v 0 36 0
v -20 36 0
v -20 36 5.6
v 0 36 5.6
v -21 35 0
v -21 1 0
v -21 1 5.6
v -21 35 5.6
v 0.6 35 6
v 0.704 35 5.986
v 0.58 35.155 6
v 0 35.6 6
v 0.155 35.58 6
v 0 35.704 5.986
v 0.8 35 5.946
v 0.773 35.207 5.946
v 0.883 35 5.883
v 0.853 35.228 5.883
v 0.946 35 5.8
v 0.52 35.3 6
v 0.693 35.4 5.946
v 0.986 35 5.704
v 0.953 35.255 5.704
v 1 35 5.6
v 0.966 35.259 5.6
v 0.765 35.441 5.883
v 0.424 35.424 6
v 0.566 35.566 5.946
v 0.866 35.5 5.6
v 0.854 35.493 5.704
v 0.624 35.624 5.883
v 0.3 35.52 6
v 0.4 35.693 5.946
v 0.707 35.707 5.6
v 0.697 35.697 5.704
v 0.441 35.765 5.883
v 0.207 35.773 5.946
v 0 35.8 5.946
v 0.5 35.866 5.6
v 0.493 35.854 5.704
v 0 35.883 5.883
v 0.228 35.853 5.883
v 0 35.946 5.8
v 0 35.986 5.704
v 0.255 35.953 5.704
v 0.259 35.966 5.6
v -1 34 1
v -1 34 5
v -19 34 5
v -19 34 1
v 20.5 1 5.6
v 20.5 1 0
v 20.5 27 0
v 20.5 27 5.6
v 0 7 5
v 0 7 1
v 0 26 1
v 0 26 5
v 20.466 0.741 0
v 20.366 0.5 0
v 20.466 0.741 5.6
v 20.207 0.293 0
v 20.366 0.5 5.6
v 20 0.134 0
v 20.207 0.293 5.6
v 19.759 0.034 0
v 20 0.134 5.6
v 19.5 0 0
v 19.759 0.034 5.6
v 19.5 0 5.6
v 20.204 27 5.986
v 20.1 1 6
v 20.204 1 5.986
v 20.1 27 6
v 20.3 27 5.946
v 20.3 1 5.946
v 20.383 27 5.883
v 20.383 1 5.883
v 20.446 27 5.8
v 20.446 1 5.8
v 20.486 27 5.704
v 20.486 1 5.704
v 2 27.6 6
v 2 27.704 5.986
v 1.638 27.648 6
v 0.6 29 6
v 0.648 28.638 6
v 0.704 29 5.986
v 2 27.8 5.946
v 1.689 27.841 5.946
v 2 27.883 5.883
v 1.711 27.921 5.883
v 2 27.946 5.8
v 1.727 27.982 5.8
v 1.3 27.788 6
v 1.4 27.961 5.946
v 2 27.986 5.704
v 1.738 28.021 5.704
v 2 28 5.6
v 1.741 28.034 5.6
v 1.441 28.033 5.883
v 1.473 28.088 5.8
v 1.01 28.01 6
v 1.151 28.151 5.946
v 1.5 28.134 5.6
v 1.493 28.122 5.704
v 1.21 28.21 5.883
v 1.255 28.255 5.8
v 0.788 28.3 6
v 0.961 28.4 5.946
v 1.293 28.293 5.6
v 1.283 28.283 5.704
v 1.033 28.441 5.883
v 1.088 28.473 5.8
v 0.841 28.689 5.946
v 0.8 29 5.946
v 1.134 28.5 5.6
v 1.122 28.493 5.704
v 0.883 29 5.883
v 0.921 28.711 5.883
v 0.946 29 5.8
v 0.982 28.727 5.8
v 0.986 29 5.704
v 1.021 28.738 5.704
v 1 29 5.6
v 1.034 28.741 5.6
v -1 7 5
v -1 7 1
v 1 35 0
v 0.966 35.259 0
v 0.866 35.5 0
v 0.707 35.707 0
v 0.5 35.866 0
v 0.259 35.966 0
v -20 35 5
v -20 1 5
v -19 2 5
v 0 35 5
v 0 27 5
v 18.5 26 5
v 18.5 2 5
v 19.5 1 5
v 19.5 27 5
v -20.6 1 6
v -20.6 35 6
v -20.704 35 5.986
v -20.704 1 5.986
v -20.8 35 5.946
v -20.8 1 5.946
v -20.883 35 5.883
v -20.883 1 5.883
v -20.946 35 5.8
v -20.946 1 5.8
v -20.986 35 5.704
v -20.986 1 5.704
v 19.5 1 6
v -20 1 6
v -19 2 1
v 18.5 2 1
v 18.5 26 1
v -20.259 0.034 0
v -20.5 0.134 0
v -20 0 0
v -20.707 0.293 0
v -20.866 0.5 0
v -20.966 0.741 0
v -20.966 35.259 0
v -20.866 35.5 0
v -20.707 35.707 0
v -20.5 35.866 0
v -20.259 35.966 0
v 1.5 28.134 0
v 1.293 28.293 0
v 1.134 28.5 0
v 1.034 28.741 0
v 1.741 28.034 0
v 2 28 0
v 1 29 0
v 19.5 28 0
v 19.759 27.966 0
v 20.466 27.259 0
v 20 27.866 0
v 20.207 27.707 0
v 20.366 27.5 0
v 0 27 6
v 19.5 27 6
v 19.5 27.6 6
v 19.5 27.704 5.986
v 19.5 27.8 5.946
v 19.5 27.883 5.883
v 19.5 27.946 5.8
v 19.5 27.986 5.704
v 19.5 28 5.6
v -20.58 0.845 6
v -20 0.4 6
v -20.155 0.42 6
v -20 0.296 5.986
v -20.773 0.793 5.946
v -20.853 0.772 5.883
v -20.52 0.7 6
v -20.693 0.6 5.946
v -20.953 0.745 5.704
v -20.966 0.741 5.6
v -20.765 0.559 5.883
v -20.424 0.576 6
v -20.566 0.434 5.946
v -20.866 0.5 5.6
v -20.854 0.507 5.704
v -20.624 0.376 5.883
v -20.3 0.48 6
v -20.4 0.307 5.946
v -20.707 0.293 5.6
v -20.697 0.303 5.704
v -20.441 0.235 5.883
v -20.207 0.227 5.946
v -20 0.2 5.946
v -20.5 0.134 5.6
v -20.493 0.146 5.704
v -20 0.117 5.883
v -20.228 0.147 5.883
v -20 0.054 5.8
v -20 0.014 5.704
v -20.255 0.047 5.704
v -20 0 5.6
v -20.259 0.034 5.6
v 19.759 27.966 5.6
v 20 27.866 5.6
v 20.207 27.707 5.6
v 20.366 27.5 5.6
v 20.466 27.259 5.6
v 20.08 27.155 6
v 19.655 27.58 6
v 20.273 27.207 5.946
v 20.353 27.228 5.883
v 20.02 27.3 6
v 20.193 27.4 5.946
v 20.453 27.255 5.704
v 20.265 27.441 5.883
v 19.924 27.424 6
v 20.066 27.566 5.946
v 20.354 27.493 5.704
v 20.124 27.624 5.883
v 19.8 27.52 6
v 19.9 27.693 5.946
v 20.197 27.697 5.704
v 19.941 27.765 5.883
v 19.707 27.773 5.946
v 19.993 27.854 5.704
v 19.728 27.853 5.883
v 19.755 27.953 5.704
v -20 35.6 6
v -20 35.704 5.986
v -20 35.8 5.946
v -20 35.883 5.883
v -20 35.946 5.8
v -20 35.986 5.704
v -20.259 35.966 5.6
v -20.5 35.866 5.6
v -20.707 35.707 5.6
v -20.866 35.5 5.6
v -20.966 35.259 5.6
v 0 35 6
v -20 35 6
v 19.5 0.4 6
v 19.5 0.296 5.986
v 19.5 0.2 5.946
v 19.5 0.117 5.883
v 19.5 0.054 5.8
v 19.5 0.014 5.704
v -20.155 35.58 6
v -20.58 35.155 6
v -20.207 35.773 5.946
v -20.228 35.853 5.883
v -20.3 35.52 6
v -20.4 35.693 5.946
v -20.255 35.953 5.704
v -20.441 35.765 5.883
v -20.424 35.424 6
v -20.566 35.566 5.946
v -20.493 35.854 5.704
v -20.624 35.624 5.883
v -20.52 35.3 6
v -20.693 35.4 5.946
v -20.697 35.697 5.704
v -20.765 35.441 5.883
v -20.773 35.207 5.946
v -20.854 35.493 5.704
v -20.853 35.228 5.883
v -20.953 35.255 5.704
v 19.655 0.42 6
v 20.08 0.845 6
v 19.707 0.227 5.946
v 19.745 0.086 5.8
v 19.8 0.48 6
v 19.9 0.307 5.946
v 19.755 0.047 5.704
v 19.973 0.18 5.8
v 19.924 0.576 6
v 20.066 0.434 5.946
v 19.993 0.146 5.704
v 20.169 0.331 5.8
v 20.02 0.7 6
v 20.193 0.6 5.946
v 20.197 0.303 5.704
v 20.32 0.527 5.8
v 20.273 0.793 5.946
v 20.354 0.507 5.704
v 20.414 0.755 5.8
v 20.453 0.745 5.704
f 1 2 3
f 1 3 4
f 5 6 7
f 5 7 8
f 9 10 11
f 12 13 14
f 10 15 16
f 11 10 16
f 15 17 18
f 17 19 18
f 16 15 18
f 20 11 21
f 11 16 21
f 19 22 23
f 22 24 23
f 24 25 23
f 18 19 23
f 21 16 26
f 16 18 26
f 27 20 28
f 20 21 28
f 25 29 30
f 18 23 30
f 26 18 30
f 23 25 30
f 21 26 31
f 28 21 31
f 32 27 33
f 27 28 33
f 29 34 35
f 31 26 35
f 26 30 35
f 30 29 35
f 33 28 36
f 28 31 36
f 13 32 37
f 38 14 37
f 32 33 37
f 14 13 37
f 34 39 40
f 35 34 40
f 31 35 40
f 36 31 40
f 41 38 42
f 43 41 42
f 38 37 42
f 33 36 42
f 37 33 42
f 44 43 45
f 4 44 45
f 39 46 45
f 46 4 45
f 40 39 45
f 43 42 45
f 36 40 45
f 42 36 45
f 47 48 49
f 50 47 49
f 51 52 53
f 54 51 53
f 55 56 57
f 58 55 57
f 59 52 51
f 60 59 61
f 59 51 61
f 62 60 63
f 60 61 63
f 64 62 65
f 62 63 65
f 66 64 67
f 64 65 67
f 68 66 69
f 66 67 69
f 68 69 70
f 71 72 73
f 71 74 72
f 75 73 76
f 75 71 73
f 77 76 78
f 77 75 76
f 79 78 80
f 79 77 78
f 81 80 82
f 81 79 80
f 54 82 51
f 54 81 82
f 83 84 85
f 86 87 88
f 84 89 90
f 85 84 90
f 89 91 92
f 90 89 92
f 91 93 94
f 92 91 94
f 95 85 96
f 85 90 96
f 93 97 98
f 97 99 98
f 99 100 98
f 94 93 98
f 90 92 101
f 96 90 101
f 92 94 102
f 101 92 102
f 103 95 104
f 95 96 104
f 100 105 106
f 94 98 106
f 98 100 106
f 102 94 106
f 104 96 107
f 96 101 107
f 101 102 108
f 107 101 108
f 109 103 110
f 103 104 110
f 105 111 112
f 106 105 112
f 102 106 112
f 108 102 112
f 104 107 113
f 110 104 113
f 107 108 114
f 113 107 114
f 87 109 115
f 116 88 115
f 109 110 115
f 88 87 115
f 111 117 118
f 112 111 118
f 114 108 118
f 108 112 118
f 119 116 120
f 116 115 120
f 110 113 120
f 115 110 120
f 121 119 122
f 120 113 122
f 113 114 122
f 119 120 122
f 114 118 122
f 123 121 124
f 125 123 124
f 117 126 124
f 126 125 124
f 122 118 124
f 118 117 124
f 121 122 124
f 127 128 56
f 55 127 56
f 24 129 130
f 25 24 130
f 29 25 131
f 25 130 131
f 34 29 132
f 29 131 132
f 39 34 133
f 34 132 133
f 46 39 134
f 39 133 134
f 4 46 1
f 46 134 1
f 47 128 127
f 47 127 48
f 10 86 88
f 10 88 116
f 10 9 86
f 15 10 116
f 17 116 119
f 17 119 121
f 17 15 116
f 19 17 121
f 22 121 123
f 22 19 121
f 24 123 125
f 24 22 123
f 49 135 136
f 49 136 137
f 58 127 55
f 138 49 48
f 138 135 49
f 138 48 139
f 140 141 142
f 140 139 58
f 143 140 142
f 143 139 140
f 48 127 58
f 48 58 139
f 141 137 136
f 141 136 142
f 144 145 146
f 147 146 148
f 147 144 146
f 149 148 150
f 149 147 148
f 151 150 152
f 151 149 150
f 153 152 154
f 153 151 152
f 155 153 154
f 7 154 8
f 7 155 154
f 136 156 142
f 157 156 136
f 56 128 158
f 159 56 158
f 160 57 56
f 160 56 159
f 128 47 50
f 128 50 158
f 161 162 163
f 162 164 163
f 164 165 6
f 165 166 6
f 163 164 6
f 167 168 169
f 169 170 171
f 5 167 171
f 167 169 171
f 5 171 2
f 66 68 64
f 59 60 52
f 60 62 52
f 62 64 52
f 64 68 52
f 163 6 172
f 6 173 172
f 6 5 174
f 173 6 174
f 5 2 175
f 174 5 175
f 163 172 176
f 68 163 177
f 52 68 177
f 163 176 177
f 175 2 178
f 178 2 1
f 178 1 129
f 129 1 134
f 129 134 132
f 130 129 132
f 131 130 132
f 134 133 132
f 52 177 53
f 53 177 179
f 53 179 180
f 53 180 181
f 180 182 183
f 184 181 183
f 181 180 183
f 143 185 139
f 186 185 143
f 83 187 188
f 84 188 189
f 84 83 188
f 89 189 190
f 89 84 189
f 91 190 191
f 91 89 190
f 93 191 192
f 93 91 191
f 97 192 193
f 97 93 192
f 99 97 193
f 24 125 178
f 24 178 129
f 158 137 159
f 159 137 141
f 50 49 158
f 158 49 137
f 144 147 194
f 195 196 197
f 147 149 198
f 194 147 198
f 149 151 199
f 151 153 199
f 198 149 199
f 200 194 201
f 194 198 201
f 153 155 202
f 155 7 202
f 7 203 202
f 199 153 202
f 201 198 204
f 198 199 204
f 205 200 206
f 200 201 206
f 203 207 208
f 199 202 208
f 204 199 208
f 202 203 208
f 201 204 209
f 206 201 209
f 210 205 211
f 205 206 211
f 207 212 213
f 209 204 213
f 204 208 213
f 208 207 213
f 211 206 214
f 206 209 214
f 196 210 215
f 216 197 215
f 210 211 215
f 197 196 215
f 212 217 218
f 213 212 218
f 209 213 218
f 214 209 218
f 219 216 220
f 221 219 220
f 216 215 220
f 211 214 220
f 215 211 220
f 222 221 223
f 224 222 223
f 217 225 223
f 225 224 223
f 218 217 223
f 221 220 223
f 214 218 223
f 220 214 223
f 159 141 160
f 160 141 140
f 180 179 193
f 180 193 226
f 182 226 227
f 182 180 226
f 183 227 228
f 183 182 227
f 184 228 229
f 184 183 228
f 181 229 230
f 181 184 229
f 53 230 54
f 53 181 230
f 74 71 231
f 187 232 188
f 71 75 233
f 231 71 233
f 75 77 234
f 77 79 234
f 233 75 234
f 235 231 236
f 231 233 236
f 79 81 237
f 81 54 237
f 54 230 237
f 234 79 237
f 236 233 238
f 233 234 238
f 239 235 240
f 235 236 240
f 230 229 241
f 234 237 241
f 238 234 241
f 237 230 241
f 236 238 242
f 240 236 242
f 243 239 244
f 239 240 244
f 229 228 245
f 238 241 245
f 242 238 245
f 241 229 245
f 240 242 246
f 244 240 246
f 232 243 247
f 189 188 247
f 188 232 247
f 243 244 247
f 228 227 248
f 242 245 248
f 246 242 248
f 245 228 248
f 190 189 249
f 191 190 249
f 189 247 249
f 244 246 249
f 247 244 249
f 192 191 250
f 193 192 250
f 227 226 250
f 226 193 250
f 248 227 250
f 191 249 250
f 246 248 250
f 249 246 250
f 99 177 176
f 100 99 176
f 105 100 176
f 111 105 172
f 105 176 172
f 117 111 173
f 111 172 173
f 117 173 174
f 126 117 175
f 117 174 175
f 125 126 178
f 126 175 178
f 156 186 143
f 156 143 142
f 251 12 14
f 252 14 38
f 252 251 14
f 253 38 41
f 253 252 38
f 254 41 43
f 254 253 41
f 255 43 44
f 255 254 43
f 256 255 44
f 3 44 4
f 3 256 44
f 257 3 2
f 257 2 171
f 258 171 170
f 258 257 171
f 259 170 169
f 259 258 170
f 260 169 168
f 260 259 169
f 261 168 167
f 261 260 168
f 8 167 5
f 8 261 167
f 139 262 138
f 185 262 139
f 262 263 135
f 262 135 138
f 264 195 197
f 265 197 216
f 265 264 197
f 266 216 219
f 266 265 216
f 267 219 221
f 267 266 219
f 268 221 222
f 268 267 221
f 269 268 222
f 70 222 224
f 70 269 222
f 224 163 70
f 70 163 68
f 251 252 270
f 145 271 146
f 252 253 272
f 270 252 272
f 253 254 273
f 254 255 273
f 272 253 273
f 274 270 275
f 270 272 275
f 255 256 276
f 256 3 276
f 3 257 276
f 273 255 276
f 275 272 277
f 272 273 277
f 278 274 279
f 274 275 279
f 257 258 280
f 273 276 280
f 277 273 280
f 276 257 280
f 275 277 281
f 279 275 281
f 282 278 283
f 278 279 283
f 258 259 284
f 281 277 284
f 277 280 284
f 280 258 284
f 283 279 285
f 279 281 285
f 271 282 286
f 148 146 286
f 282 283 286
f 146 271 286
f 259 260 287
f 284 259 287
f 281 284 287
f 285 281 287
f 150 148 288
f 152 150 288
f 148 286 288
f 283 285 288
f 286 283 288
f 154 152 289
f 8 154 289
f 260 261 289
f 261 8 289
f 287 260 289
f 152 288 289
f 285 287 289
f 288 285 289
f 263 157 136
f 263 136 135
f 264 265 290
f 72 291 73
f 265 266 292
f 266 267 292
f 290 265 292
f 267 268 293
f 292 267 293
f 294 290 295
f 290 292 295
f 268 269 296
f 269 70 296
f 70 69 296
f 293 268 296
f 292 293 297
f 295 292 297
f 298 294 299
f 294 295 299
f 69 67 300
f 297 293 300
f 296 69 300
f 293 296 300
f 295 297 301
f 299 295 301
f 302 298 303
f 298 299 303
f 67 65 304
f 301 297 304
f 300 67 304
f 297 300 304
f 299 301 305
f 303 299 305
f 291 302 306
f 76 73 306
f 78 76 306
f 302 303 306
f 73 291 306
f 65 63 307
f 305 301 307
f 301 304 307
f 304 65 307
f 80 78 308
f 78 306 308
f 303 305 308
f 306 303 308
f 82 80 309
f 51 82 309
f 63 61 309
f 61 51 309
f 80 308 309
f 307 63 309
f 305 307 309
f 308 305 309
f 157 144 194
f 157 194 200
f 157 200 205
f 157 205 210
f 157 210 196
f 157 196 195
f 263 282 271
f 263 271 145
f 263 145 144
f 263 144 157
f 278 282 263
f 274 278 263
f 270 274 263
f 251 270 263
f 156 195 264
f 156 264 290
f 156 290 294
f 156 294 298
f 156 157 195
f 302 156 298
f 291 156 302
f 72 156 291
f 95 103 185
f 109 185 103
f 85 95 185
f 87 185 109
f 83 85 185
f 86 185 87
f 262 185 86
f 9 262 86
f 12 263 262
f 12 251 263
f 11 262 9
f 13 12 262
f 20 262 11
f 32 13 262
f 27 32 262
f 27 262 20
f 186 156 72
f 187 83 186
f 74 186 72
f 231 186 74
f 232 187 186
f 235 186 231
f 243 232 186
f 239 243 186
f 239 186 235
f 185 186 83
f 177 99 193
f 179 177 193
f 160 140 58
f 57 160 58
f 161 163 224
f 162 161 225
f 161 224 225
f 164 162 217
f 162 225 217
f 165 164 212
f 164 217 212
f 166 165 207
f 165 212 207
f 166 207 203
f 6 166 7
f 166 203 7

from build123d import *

# Parameters (mm, degrees)
SKETCH_W        = 41.5
SKETCH_H        = 36
PAD_DEPTH       = 6
POCKET_DEPTH    = 5
SKETCH002_W     = 19.5
SKETCH002_H     = 8
POCKET001_DEPTH = 6.001
POCKET002_DEPTH = 1
SKETCH005_W     = 1
SKETCH005_H     = 19
PAD001_DEPTH    = 4
FILLET_R        = 1
FILLET001_R     = 0.4


with BuildPart() as part:
    # Sketch → Pad (new body)
    with BuildSketch(Plane.XY):
        with Locations((-0.25, 18)):
            Rectangle(SKETCH_W, SKETCH_H)
    extrude(amount=PAD_DEPTH)

    # Sketch001 (on Face6 of Pad) → Pocket (cut)
    with BuildSketch(Plane.XY.offset(6)):
        Polygon((-19, 2), (18.5, 2), (18.5, 26), (-1, 26), (-1, 34), (-19, 34), align=None)
    extrude(amount=-POCKET_DEPTH, mode=Mode.SUBTRACT)

    # Sketch002 (on Face5 of Pocket) → Pocket001 (cut, through all)
    with BuildSketch(Plane.XY.offset(6)):
        with Locations((10.75, 32)):
            Rectangle(SKETCH002_W, SKETCH002_H)
    extrude(amount=-POCKET001_DEPTH, mode=Mode.SUBTRACT)

    # Sketch004 (on Face5 of Pocket001) → Pocket002 (cut)
    with BuildSketch(Plane.XY.offset(6)):
        Polygon((-20, 35), (0, 35), (0, 27), (19.5, 27), (19.5, 1), (-20, 1), align=None)
    extrude(amount=-POCKET002_DEPTH, mode=Mode.SUBTRACT)

    # Sketch005 (on Face22 of Pocket002) → Pad001 (join)
    with BuildSketch(Plane.XY.offset(1)):
        with Locations((-0.5, 16.5)):
            Rectangle(SKETCH005_W, SKETCH005_H)
    extrude(amount=PAD001_DEPTH)

    # Fillet
    fillet_edges = [part.edges().sort_by_distance(p)[0] for p in [
        (-21, 0, 3),
        (20.5, 0, 3),
        (20.5, 28, 3),
        (1, 28, 3),
        (1, 36, 3),
        (-21, 36, 3),
    ]]
    fillet(fillet_edges, radius=FILLET_R)

    # Fillet001
    fillet001_edges = [part.edges().sort_by_distance(p)[0] for p in [
        (20.5, 14, 6),
        (20.207107, 0.292893, 6),
        (-0.25, 0, 6),
        (20.207107, 27.707107, 6),
        (10.75, 28, 6),
        (1.292893, 28.292893, 6),
        (1, 32, 6),
        (0.707107, 35.707107, 6),
        (-10, 36, 6),
        (-21, 18, 6),
        (-20.707107, 0.292893, 6),
    ]]
    fillet(fillet001_edges, radius=FILLET001_R)


solid = part.part
